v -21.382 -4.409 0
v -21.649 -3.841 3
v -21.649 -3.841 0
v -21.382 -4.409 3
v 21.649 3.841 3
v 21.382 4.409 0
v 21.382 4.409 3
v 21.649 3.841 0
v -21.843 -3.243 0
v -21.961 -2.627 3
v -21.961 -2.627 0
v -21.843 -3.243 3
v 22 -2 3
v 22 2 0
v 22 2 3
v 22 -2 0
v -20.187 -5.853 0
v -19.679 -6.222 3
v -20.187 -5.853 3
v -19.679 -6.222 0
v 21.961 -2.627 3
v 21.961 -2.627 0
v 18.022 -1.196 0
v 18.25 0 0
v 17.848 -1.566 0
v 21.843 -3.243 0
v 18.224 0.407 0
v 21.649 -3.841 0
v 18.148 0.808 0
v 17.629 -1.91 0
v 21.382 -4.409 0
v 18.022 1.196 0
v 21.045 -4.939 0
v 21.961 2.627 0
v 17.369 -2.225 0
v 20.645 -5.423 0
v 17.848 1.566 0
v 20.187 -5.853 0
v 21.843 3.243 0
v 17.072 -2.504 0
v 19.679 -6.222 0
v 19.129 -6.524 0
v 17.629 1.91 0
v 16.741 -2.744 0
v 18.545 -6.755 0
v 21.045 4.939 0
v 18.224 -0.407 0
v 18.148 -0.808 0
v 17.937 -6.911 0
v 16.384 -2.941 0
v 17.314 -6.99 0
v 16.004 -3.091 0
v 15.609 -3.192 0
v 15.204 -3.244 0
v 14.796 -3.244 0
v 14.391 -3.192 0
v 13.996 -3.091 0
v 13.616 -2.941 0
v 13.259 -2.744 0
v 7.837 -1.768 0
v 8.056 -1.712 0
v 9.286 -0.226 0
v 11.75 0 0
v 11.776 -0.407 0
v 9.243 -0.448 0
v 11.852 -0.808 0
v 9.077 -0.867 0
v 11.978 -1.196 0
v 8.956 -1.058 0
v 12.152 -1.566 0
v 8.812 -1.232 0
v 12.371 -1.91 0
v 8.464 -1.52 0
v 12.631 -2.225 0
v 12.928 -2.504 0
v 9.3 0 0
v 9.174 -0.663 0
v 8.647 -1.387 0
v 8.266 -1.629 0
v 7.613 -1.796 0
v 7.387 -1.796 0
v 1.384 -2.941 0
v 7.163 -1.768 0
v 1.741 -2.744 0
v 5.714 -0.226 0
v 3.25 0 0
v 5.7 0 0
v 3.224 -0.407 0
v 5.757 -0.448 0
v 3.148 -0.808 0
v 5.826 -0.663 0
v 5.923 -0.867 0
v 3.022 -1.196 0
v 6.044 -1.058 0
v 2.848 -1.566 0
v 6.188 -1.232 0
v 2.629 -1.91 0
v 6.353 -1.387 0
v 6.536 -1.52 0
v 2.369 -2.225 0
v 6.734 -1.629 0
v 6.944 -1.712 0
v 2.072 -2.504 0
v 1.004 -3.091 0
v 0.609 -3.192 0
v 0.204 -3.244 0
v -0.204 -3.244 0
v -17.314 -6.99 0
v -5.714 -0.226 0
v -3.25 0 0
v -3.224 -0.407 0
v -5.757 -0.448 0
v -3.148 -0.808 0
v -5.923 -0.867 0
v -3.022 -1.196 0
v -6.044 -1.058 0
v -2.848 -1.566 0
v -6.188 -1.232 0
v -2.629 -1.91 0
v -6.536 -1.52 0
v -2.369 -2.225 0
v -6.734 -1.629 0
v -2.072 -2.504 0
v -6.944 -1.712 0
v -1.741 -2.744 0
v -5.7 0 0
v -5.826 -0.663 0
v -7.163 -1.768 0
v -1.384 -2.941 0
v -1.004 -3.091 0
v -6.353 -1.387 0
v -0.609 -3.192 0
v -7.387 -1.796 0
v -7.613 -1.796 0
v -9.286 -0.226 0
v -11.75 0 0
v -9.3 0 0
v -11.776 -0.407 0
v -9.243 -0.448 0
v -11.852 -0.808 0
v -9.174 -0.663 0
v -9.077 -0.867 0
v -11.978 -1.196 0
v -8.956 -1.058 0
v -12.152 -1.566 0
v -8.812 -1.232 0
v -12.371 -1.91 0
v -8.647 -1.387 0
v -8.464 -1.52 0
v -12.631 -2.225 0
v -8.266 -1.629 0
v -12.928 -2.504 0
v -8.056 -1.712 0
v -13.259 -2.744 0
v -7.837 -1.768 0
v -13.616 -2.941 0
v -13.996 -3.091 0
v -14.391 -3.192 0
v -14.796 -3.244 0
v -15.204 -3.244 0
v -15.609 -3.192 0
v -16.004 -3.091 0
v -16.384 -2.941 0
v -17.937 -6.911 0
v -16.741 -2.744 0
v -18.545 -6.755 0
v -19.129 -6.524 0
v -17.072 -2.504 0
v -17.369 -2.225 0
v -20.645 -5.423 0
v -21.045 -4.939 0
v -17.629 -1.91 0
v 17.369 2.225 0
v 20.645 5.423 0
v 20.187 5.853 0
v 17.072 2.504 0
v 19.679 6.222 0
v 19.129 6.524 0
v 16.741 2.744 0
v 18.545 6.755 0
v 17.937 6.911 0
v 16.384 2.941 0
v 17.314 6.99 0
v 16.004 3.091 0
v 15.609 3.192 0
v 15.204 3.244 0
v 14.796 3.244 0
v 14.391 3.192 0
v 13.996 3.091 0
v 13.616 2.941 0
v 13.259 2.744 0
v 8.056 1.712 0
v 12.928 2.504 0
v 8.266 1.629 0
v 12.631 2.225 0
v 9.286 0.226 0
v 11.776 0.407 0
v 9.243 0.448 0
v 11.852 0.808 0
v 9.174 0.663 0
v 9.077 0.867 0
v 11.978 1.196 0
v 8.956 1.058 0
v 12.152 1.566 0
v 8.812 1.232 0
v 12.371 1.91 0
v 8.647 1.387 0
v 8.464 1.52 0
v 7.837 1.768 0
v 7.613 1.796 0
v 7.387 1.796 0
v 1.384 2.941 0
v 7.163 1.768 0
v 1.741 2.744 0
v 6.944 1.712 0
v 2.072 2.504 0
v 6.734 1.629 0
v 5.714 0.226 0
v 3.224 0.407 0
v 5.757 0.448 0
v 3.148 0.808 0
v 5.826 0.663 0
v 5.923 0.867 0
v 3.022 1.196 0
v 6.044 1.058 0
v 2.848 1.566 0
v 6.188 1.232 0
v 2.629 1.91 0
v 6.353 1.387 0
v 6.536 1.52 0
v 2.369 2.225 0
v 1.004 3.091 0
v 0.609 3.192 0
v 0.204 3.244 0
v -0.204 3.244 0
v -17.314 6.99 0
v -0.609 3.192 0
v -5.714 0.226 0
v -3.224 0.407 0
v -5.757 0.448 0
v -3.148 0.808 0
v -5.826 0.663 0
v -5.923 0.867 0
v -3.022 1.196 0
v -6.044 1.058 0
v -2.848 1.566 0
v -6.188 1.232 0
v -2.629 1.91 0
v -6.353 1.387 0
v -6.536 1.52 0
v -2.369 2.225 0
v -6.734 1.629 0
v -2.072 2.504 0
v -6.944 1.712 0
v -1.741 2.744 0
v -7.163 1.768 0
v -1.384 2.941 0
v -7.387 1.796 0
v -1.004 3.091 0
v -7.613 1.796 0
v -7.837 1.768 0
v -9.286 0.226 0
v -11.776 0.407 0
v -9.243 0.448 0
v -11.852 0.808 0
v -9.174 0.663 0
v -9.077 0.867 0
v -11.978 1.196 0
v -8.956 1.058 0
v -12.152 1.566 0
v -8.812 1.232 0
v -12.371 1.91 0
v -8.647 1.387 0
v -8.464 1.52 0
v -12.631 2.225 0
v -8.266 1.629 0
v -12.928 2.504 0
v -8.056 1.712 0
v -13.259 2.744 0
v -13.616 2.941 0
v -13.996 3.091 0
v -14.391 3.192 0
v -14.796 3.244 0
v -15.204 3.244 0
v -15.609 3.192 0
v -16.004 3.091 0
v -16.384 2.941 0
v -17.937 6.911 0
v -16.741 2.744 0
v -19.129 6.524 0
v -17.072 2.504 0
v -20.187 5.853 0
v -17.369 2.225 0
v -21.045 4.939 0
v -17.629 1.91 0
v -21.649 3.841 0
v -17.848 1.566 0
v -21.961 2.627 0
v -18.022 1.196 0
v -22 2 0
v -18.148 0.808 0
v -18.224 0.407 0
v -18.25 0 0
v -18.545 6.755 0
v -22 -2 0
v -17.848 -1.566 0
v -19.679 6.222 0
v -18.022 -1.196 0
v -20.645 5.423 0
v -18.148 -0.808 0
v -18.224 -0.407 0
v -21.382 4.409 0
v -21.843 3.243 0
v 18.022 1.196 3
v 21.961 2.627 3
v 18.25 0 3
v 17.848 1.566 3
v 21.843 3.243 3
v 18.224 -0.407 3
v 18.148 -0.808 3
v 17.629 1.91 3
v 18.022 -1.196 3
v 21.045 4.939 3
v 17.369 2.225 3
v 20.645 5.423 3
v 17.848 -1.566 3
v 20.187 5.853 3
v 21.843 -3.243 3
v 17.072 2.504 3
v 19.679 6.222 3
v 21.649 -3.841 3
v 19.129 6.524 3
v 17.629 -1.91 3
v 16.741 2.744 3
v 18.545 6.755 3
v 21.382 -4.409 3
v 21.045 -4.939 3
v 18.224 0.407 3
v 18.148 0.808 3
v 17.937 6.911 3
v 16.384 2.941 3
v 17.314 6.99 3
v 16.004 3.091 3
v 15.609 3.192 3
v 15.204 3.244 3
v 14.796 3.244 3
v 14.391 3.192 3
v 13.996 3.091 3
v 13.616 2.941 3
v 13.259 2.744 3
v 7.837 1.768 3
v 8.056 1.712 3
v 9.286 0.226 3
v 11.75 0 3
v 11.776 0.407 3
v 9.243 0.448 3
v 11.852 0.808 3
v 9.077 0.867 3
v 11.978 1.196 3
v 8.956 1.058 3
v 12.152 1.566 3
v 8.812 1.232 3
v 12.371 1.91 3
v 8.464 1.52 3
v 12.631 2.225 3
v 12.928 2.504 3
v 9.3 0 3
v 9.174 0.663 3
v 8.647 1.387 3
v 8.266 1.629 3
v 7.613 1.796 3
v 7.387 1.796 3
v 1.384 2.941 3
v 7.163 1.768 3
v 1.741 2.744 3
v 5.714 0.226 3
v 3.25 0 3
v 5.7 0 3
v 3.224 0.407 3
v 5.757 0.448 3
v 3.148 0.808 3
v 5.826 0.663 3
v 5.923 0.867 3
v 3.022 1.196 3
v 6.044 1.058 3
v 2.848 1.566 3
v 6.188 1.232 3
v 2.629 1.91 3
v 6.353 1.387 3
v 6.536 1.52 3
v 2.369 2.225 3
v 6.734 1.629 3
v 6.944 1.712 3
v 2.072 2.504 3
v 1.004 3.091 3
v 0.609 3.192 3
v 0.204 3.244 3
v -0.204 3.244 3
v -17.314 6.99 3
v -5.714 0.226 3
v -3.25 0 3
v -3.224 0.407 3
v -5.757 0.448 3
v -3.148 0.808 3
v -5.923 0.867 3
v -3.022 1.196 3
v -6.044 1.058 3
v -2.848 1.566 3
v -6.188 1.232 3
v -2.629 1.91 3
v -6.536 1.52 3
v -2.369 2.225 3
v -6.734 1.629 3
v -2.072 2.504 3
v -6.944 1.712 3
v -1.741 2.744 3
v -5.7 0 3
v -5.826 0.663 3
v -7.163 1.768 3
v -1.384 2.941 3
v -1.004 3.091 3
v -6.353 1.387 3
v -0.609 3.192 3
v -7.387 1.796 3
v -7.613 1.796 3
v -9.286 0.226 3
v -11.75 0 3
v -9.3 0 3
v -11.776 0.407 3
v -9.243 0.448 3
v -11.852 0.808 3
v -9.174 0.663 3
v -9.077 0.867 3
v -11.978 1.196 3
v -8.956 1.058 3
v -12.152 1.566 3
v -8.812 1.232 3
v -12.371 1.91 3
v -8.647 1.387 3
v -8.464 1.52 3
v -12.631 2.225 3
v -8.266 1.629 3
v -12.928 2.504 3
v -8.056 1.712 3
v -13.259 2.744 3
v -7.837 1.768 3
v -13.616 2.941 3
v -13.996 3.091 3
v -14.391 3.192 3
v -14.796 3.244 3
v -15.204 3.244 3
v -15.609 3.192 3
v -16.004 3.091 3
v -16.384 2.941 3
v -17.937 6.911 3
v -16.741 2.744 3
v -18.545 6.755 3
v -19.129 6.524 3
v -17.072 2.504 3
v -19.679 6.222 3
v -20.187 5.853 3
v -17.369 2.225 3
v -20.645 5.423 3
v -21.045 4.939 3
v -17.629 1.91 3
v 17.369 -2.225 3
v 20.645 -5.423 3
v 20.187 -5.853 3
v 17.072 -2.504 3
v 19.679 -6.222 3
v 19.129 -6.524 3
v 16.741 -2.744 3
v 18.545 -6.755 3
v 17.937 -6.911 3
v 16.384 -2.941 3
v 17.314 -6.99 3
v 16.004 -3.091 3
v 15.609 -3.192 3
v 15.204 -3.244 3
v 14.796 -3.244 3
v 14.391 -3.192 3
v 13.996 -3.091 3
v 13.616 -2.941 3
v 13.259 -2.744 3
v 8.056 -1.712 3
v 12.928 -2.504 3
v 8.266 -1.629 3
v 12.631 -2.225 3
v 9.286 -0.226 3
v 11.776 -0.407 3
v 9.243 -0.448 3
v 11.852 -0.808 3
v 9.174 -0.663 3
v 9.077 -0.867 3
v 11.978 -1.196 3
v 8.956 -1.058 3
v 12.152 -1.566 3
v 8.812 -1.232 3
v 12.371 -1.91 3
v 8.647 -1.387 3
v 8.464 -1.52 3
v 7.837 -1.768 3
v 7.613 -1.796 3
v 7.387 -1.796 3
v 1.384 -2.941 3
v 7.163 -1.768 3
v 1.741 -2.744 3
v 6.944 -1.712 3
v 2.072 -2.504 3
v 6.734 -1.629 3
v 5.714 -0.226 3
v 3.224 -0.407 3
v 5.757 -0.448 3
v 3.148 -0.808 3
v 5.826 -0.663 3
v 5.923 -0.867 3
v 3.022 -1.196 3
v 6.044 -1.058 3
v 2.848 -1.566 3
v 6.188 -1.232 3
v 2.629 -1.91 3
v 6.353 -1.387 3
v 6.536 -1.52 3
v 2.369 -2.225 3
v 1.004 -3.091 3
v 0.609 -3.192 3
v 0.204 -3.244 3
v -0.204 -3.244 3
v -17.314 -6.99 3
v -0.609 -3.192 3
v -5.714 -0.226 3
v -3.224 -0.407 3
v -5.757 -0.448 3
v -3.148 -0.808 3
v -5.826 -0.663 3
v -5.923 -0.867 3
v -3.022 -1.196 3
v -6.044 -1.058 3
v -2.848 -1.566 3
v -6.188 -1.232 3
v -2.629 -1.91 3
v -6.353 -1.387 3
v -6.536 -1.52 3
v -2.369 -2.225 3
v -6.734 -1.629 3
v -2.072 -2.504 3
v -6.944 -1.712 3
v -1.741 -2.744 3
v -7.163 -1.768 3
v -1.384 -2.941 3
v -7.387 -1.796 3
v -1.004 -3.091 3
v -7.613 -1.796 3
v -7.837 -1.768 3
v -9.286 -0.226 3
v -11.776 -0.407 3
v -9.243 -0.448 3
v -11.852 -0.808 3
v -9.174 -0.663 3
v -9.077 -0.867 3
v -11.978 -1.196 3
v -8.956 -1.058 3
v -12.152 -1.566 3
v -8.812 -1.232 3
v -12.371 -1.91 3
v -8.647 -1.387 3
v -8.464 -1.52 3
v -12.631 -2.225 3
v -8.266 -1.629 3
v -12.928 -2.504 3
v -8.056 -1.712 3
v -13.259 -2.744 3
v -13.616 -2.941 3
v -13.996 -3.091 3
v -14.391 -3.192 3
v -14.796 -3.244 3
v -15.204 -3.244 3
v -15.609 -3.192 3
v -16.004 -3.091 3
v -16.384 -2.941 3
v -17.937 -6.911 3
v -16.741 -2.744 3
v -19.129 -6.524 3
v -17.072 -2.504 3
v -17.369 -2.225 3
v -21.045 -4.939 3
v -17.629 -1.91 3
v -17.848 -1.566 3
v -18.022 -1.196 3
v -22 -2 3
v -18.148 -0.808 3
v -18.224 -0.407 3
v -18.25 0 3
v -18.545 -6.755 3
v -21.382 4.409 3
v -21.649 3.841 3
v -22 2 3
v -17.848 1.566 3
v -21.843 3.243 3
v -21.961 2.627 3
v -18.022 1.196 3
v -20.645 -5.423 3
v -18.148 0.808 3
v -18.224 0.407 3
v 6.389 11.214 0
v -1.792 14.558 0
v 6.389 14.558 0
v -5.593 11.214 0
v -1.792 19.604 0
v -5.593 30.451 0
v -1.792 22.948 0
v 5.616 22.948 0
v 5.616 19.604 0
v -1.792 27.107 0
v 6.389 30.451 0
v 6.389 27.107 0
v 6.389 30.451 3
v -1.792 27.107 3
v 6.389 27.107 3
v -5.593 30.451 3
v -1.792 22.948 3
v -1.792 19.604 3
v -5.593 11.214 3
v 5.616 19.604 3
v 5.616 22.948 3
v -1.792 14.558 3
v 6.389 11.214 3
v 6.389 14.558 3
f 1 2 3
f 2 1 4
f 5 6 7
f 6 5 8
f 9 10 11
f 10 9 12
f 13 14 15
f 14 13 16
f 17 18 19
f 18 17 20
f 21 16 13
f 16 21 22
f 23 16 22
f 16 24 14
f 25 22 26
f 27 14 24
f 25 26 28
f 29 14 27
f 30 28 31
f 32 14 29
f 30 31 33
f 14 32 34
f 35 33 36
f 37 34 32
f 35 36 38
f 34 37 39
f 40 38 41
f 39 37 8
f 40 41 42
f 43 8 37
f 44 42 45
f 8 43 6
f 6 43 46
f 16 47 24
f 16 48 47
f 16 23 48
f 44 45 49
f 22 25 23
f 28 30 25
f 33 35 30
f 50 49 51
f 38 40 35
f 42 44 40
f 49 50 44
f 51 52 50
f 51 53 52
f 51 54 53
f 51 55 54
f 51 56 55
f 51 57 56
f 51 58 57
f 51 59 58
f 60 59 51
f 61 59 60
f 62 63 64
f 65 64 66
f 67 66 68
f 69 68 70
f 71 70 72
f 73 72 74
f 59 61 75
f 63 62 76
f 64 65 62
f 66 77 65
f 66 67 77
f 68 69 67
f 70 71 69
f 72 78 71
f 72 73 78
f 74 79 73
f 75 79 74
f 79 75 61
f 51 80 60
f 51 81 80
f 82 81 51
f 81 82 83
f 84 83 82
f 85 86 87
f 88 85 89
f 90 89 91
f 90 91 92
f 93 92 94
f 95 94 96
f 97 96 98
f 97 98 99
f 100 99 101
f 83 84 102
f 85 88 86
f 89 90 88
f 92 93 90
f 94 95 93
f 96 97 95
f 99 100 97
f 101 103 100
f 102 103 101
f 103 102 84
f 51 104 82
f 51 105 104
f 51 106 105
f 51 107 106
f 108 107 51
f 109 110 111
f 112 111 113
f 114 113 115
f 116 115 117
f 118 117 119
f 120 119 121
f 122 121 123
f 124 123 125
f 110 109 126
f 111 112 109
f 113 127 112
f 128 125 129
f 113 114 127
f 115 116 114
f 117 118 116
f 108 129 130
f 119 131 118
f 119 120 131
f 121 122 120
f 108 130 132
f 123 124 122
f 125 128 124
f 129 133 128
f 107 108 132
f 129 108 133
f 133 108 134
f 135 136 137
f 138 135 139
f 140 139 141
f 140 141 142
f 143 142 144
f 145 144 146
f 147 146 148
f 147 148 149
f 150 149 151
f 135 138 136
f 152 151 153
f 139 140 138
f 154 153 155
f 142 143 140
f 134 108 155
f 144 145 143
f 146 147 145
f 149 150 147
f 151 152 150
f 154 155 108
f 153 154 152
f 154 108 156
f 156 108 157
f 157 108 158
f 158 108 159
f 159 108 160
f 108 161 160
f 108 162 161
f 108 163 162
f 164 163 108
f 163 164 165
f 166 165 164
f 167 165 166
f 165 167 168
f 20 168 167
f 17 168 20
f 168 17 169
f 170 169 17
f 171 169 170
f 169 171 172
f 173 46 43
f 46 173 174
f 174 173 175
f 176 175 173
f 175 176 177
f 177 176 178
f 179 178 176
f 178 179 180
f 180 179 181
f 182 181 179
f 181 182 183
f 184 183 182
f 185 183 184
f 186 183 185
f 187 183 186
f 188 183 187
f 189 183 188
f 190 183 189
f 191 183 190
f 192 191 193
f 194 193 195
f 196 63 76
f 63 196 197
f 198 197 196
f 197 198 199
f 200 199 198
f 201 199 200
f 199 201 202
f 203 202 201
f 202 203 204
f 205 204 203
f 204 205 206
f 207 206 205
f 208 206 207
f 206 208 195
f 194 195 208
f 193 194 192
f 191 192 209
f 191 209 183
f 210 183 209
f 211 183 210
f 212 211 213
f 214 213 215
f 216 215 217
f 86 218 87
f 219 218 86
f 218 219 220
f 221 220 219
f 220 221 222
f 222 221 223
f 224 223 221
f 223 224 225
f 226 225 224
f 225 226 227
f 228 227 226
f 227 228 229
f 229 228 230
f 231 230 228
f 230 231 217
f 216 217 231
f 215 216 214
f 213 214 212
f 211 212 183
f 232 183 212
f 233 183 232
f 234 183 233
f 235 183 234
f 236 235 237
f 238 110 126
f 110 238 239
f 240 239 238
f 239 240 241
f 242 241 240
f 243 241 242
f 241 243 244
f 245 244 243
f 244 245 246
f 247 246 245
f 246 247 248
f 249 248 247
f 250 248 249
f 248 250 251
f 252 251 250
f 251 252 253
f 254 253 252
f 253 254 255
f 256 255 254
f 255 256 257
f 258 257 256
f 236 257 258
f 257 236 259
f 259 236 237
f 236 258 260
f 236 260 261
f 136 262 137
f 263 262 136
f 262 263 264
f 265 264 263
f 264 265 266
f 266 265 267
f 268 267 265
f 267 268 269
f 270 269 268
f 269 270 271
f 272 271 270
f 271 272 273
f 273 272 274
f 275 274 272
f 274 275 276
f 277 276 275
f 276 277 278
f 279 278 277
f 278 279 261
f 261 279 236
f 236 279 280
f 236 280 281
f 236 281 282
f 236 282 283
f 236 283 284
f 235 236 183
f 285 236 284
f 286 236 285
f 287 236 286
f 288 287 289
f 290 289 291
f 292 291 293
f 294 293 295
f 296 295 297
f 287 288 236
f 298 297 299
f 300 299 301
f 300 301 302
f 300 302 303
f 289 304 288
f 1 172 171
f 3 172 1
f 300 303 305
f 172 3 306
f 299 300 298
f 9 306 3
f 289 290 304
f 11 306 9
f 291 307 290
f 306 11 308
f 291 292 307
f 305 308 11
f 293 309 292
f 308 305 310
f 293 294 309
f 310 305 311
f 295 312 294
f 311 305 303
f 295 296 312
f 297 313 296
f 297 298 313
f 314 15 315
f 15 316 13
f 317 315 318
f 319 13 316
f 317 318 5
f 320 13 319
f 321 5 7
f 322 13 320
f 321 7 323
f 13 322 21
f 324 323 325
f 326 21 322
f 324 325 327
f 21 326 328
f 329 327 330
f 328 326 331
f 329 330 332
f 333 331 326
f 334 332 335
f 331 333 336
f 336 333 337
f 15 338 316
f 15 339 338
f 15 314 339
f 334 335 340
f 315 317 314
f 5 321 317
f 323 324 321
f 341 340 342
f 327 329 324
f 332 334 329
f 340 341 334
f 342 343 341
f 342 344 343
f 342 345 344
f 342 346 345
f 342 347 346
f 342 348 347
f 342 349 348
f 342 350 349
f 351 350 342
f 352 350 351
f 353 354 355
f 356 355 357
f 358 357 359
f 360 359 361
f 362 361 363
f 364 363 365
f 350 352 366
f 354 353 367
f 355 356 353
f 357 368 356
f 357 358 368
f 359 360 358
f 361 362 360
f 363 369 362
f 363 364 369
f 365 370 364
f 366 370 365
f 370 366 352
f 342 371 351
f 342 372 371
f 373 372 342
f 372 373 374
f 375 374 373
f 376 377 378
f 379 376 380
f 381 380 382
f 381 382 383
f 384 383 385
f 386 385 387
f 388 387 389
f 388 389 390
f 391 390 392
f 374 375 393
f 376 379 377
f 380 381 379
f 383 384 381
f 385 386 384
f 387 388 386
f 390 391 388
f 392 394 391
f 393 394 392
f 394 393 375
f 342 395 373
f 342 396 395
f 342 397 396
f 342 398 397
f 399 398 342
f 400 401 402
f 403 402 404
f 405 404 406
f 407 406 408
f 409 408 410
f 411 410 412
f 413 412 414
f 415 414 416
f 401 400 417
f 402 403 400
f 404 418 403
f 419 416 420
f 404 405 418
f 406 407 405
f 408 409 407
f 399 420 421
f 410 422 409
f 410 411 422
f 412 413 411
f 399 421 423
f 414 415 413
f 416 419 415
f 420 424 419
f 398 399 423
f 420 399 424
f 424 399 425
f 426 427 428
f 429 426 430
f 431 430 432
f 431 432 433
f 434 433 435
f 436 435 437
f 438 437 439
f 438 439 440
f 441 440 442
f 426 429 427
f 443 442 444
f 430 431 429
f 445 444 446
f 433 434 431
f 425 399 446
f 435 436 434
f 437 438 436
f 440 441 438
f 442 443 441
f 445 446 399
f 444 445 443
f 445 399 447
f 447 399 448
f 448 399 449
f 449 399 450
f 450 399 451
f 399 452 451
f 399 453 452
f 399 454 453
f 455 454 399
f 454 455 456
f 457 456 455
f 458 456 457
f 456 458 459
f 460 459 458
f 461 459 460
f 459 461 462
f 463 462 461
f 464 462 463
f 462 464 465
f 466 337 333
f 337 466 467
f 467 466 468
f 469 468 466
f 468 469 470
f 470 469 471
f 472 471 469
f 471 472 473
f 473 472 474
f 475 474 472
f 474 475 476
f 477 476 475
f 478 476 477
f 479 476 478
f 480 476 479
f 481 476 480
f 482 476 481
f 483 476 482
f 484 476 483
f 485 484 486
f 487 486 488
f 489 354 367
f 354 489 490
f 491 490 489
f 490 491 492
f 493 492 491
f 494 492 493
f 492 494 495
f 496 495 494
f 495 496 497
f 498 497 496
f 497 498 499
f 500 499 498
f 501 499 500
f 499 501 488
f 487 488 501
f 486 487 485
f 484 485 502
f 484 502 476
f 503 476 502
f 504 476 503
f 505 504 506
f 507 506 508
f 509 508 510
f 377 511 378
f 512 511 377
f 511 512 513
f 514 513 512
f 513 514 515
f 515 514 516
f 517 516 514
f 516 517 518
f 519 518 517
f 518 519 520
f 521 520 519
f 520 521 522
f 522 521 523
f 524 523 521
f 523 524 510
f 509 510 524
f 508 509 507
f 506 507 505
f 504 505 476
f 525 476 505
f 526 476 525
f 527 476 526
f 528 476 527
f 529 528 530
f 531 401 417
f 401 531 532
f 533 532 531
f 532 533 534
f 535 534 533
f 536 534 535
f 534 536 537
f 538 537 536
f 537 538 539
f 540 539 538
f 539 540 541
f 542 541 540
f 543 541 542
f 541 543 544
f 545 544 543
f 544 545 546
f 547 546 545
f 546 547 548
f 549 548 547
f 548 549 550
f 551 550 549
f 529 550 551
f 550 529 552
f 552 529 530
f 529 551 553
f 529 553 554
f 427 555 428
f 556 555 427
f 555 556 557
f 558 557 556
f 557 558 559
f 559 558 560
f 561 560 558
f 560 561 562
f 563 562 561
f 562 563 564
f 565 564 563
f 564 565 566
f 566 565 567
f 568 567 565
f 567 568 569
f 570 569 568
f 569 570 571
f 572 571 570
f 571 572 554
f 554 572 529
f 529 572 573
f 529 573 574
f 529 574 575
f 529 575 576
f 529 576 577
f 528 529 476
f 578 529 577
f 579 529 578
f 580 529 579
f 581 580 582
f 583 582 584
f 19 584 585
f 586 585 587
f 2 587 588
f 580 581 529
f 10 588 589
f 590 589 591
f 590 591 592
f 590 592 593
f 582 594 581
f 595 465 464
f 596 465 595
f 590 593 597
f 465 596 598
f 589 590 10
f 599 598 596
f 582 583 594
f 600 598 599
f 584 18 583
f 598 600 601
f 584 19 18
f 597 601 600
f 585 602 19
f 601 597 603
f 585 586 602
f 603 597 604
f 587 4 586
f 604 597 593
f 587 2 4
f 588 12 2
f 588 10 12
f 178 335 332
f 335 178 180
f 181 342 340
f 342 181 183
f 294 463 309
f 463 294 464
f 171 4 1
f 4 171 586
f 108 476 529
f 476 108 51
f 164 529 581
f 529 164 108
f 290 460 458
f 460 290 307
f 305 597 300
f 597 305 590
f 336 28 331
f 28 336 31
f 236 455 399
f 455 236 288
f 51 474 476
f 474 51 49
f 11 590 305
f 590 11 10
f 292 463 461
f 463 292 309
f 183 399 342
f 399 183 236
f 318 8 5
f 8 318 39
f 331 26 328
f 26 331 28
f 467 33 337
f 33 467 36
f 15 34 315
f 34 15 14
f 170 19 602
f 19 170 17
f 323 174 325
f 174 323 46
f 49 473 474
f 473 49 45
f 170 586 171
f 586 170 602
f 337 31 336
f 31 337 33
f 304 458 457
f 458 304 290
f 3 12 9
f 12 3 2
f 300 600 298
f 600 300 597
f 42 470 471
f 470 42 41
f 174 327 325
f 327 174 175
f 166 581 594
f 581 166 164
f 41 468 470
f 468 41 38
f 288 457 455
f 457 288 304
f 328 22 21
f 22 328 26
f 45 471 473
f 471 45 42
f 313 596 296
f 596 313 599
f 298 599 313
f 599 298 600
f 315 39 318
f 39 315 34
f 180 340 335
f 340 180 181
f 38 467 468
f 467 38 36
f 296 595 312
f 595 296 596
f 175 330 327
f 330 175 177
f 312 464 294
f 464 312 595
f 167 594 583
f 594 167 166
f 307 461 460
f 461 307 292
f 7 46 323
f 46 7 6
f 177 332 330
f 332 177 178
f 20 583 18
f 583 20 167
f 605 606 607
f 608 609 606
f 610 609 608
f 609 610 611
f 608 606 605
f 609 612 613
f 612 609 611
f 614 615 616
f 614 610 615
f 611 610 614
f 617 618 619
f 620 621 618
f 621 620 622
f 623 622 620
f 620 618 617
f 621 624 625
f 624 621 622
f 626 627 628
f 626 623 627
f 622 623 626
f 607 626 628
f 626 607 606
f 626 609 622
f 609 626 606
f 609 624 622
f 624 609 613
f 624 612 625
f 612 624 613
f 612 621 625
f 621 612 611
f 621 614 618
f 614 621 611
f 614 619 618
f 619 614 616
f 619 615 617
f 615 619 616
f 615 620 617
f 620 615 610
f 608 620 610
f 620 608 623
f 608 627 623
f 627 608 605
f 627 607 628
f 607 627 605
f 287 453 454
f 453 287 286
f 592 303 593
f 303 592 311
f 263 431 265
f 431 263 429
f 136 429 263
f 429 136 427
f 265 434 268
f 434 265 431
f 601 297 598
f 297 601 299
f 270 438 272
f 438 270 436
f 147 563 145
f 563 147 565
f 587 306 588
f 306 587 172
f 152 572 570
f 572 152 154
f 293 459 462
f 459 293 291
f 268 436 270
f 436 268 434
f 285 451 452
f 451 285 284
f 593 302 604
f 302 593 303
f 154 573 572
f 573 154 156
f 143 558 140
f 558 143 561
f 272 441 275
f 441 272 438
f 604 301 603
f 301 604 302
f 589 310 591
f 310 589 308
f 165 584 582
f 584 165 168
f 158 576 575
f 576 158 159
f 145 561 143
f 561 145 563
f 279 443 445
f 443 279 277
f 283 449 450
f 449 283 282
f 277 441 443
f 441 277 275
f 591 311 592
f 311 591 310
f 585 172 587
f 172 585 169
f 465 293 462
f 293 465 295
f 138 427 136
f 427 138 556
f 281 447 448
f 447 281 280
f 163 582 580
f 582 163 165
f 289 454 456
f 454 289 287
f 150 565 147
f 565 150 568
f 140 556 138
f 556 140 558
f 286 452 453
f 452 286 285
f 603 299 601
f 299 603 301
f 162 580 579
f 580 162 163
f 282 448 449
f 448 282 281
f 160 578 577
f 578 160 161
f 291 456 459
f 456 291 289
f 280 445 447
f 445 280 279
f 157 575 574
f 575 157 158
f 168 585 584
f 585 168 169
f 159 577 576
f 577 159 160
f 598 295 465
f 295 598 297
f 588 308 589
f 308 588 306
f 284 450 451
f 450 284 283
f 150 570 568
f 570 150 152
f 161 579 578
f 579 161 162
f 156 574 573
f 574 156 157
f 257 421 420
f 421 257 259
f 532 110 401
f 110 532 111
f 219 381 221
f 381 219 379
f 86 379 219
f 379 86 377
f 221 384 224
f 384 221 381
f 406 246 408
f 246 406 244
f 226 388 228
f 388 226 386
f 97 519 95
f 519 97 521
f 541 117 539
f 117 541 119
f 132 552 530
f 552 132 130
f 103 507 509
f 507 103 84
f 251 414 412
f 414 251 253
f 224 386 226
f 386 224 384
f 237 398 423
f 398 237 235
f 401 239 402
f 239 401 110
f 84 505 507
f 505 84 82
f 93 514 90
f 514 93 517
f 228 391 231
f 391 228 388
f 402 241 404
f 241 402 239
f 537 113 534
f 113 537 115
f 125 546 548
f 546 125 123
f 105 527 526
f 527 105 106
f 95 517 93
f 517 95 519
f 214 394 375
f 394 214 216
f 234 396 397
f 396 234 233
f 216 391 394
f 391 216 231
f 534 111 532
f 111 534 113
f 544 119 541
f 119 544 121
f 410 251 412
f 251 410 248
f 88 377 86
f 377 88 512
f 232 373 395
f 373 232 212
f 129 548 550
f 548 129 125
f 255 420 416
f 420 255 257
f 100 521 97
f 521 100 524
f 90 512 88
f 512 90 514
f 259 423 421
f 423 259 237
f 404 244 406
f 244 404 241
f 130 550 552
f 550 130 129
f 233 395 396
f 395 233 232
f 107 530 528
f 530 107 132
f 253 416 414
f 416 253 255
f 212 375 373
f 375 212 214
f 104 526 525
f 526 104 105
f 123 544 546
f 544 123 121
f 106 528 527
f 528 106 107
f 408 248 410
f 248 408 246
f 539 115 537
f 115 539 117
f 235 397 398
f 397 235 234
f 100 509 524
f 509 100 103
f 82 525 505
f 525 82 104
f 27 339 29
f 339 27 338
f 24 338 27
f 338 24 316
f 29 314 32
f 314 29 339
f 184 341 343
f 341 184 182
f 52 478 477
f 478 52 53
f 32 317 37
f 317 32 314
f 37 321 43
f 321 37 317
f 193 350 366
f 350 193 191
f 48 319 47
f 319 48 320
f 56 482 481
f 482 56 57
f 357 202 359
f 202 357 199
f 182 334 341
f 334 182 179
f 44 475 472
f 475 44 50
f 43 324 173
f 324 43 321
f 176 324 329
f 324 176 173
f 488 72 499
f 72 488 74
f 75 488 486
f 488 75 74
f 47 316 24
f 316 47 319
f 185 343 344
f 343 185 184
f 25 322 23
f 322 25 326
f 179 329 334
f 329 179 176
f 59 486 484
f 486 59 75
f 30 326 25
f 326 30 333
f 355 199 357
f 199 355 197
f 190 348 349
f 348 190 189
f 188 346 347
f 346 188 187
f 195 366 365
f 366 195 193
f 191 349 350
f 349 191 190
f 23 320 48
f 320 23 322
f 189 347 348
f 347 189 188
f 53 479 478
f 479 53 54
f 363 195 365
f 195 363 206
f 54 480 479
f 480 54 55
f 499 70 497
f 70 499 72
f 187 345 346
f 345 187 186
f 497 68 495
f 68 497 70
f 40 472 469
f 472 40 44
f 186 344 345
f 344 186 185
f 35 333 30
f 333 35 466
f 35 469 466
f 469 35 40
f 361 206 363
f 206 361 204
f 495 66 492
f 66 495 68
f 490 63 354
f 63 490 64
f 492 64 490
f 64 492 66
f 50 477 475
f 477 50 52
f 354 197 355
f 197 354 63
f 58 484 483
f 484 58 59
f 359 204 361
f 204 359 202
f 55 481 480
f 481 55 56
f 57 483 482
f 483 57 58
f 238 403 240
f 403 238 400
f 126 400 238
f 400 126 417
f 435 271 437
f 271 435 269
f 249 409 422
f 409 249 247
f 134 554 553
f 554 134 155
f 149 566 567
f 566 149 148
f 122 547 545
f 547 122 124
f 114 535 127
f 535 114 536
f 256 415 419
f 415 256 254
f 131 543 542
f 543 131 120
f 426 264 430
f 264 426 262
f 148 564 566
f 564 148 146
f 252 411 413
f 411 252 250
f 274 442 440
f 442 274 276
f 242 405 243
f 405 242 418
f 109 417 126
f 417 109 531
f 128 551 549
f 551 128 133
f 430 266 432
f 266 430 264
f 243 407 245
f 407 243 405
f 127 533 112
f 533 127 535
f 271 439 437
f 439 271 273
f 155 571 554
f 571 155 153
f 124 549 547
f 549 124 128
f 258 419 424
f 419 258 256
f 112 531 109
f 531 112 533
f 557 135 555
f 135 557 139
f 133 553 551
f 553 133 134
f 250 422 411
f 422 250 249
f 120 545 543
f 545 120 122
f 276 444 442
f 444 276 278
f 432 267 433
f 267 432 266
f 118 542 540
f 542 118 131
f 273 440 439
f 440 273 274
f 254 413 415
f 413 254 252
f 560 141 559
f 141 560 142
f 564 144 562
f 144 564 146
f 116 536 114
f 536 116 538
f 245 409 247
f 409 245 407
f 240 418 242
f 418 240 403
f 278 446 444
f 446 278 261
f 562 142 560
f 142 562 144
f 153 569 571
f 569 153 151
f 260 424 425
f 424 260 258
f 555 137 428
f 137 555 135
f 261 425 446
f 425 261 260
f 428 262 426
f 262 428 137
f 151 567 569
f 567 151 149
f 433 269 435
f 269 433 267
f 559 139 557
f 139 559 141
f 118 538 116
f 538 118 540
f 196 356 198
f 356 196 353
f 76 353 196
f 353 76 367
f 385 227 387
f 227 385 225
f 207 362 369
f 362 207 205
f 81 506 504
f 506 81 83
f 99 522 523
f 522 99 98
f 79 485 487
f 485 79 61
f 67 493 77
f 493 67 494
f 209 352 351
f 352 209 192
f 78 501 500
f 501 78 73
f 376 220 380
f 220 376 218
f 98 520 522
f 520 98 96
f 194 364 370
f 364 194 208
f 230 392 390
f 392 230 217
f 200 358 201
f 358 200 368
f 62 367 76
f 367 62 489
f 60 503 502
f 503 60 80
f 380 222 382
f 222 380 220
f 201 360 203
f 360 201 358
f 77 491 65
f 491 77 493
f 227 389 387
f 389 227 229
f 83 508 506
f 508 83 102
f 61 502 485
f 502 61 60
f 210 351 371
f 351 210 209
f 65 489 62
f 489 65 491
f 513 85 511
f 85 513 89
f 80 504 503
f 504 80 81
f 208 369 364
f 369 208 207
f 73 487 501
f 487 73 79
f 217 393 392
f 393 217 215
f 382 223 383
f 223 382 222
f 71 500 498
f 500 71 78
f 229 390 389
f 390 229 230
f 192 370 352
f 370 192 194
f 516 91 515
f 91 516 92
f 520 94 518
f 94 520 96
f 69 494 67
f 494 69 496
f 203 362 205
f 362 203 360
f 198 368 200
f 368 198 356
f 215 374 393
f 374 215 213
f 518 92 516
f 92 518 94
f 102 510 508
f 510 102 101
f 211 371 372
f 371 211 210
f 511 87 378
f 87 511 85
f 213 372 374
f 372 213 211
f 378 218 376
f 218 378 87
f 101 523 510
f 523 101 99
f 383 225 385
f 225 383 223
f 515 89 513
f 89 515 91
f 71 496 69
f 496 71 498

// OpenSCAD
$fn = 50;


difference() {
	union() {
		hull() {
			translate(v = [-17.0000000000, 2.0000000000, 0]) {
				cylinder(h = 3, r = 5);
			}
			translate(v = [17.0000000000, 2.0000000000, 0]) {
				cylinder(h = 3, r = 5);
			}
			translate(v = [-17.0000000000, -2.0000000000, 0]) {
				cylinder(h = 3, r = 5);
			}
			translate(v = [17.0000000000, -2.0000000000, 0]) {
				cylinder(h = 3, r = 5);
			}
		}
		translate(v = [0, 30.0000000000, 0]) {
			linear_extrude(height = 3) {
				text(font = "DejaVu Sans Mono:style=Bold", halign = "center", size = 19.0000000000, text = "E", valign = "top");
			}
		}
	}
	union() {
		translate(v = [-15.0000000000, 0.0000000000, 0]) {
			translate(v = [0, 0, -100]) {
				cylinder(h = 200, r = 3.2500000000);
			}
		}
		translate(v = [0, 0, -100]) {
			cylinder(h = 200, r = 3.2500000000);
		}
		translate(v = [15.0000000000, 0.0000000000, 0]) {
			translate(v = [0, 0, -100]) {
				cylinder(h = 200, r = 3.2500000000);
			}
		}
		translate(v = [-15.0000000000, 0.0000000000, 0]) {
			translate(v = [0, 0, -100]) {
				cylinder(h = 200, r = 1.8000000000);
			}
		}
		translate(v = [-7.5000000000, 0.0000000000, 0]) {
			translate(v = [0, 0, -100]) {
				cylinder(h = 200, r = 1.8000000000);
			}
		}
		translate(v = [0, 0, -100]) {
			cylinder(h = 200, r = 1.8000000000);
		}
		translate(v = [7.5000000000, 0.0000000000, 0]) {
			translate(v = [0, 0, -100]) {
				cylinder(h = 200, r = 1.8000000000);
			}
		}
		translate(v = [15.0000000000, 0.0000000000, 0]) {
			translate(v = [0, 0, -100]) {
				cylinder(h = 200, r = 1.8000000000);
			}
		}
	}
}
